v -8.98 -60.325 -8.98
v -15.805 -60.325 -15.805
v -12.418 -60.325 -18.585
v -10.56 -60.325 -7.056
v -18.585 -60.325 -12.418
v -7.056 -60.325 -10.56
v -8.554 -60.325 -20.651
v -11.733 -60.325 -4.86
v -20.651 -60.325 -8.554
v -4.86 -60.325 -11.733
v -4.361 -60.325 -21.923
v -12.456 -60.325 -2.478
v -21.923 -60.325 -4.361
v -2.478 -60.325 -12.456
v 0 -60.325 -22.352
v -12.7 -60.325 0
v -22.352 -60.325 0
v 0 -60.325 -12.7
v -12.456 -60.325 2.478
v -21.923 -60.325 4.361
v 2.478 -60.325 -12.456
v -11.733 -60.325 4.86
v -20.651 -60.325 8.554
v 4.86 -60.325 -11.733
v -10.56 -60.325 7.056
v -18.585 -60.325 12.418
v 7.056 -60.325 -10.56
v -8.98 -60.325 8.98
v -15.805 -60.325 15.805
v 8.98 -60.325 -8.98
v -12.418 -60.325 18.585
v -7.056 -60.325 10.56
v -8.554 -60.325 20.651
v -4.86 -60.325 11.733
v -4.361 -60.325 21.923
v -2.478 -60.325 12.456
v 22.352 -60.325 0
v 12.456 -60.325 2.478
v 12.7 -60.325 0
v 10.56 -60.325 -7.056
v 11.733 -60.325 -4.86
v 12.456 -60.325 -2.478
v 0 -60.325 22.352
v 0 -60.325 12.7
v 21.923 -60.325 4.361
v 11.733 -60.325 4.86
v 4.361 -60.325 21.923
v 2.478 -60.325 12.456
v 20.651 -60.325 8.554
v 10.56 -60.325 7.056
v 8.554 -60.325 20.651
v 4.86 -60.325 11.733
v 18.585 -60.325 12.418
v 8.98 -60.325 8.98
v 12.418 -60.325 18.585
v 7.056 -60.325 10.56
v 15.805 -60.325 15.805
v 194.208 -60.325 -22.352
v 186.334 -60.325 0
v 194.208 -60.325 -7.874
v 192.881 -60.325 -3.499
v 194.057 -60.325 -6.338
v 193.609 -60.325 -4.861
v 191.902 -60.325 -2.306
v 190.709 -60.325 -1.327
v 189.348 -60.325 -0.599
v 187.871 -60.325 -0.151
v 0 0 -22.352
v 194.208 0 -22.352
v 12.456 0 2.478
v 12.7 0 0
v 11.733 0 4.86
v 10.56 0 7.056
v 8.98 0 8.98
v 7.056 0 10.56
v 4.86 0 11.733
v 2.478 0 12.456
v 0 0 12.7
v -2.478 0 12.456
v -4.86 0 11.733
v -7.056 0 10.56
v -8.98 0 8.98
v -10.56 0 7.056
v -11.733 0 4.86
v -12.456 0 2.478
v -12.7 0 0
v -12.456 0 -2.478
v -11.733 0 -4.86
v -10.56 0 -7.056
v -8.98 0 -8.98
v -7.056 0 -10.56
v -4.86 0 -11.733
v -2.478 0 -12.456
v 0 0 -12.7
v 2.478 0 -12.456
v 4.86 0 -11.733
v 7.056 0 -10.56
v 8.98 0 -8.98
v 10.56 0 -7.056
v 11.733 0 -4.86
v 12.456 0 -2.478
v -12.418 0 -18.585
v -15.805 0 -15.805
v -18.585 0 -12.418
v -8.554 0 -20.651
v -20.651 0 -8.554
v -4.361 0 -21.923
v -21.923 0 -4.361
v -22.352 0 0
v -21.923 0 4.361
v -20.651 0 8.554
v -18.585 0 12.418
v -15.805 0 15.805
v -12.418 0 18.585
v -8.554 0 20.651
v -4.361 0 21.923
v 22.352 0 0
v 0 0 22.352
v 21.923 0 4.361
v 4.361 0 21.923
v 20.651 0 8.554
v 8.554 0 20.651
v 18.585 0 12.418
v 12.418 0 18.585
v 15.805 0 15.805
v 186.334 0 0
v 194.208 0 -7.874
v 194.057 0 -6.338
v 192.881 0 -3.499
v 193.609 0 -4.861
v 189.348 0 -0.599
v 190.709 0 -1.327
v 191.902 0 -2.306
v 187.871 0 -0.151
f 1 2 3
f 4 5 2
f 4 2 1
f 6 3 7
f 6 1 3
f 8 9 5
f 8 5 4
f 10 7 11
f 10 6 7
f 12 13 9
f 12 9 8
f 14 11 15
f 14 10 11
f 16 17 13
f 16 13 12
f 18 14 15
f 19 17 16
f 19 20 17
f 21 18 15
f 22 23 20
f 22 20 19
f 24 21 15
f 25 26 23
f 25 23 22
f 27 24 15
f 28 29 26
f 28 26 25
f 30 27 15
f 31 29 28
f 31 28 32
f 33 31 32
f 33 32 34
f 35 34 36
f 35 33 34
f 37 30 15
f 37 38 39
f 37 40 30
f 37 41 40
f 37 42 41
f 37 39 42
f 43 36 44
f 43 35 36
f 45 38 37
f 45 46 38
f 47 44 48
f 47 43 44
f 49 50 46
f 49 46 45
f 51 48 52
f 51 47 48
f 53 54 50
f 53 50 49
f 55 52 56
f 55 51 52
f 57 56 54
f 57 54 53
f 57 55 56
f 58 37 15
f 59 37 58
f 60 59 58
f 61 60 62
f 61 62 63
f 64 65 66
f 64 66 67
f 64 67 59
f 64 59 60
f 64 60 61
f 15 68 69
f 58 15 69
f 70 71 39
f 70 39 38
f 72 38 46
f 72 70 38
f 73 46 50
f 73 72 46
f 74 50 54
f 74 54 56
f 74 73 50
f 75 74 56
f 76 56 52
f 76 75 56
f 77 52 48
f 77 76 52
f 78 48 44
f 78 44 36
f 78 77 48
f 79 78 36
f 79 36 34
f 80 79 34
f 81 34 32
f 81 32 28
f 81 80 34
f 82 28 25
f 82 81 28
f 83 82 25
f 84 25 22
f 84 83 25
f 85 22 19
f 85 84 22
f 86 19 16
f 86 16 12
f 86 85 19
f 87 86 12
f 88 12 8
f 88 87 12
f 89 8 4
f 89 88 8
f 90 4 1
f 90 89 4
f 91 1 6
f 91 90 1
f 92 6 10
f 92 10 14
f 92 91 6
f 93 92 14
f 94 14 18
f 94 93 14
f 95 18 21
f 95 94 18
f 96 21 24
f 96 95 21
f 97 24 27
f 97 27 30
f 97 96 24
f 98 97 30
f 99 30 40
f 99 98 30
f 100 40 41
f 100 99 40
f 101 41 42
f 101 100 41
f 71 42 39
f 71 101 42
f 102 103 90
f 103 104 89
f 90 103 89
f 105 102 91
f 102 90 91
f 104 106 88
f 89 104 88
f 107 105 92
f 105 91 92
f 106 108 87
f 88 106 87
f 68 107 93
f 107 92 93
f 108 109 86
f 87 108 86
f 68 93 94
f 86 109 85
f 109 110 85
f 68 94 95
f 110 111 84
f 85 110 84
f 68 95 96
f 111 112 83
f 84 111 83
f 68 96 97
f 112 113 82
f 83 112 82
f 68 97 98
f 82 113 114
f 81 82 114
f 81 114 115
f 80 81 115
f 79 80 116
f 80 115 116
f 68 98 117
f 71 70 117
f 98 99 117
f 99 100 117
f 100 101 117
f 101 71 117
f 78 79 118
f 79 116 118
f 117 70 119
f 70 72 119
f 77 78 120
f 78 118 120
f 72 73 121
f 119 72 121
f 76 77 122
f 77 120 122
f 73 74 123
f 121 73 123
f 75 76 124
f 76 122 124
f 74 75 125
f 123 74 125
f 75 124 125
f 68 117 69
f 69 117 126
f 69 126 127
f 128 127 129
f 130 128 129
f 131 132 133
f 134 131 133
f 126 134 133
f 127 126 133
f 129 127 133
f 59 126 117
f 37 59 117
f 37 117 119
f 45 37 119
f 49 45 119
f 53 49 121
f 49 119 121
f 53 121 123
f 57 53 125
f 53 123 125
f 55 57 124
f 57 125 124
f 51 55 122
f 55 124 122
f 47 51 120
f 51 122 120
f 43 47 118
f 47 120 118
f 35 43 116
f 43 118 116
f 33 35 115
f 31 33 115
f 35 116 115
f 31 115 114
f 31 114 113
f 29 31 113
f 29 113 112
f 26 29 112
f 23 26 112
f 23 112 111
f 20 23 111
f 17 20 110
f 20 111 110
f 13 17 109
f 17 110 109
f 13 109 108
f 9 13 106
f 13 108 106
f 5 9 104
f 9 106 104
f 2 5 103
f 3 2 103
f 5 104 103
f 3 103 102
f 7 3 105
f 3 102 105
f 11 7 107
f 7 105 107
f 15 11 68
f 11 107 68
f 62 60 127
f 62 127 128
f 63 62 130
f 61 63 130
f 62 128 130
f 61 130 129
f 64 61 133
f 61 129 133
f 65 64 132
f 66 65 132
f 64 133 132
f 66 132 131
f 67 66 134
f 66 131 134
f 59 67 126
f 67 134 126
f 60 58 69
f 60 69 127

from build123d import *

# Parameters (mm, degrees)
F0_R     = 12.7
F1_DEPTH = 60.325


with BuildPart() as f1:
    # F0 (on Front) → F1 (new body)
    with BuildSketch(Plane.XZ):
        with BuildLine():
            Line((186.3344, 0), (22.352, 0))
            ThreePointArc((22.352, 0), (-15.805251, 15.805251), (0, -22.352))
            Line((0, -22.352), (194.2084, -22.352))
            Line((194.2084, -22.352), (194.2084, -7.874))
            ThreePointArc((194.2084, -7.874), (191.902159, -2.306241), (186.3344, 0))
        make_face()
        Circle(F0_R, mode=Mode.SUBTRACT)
    extrude(amount=F1_DEPTH)


solid = f1.part
